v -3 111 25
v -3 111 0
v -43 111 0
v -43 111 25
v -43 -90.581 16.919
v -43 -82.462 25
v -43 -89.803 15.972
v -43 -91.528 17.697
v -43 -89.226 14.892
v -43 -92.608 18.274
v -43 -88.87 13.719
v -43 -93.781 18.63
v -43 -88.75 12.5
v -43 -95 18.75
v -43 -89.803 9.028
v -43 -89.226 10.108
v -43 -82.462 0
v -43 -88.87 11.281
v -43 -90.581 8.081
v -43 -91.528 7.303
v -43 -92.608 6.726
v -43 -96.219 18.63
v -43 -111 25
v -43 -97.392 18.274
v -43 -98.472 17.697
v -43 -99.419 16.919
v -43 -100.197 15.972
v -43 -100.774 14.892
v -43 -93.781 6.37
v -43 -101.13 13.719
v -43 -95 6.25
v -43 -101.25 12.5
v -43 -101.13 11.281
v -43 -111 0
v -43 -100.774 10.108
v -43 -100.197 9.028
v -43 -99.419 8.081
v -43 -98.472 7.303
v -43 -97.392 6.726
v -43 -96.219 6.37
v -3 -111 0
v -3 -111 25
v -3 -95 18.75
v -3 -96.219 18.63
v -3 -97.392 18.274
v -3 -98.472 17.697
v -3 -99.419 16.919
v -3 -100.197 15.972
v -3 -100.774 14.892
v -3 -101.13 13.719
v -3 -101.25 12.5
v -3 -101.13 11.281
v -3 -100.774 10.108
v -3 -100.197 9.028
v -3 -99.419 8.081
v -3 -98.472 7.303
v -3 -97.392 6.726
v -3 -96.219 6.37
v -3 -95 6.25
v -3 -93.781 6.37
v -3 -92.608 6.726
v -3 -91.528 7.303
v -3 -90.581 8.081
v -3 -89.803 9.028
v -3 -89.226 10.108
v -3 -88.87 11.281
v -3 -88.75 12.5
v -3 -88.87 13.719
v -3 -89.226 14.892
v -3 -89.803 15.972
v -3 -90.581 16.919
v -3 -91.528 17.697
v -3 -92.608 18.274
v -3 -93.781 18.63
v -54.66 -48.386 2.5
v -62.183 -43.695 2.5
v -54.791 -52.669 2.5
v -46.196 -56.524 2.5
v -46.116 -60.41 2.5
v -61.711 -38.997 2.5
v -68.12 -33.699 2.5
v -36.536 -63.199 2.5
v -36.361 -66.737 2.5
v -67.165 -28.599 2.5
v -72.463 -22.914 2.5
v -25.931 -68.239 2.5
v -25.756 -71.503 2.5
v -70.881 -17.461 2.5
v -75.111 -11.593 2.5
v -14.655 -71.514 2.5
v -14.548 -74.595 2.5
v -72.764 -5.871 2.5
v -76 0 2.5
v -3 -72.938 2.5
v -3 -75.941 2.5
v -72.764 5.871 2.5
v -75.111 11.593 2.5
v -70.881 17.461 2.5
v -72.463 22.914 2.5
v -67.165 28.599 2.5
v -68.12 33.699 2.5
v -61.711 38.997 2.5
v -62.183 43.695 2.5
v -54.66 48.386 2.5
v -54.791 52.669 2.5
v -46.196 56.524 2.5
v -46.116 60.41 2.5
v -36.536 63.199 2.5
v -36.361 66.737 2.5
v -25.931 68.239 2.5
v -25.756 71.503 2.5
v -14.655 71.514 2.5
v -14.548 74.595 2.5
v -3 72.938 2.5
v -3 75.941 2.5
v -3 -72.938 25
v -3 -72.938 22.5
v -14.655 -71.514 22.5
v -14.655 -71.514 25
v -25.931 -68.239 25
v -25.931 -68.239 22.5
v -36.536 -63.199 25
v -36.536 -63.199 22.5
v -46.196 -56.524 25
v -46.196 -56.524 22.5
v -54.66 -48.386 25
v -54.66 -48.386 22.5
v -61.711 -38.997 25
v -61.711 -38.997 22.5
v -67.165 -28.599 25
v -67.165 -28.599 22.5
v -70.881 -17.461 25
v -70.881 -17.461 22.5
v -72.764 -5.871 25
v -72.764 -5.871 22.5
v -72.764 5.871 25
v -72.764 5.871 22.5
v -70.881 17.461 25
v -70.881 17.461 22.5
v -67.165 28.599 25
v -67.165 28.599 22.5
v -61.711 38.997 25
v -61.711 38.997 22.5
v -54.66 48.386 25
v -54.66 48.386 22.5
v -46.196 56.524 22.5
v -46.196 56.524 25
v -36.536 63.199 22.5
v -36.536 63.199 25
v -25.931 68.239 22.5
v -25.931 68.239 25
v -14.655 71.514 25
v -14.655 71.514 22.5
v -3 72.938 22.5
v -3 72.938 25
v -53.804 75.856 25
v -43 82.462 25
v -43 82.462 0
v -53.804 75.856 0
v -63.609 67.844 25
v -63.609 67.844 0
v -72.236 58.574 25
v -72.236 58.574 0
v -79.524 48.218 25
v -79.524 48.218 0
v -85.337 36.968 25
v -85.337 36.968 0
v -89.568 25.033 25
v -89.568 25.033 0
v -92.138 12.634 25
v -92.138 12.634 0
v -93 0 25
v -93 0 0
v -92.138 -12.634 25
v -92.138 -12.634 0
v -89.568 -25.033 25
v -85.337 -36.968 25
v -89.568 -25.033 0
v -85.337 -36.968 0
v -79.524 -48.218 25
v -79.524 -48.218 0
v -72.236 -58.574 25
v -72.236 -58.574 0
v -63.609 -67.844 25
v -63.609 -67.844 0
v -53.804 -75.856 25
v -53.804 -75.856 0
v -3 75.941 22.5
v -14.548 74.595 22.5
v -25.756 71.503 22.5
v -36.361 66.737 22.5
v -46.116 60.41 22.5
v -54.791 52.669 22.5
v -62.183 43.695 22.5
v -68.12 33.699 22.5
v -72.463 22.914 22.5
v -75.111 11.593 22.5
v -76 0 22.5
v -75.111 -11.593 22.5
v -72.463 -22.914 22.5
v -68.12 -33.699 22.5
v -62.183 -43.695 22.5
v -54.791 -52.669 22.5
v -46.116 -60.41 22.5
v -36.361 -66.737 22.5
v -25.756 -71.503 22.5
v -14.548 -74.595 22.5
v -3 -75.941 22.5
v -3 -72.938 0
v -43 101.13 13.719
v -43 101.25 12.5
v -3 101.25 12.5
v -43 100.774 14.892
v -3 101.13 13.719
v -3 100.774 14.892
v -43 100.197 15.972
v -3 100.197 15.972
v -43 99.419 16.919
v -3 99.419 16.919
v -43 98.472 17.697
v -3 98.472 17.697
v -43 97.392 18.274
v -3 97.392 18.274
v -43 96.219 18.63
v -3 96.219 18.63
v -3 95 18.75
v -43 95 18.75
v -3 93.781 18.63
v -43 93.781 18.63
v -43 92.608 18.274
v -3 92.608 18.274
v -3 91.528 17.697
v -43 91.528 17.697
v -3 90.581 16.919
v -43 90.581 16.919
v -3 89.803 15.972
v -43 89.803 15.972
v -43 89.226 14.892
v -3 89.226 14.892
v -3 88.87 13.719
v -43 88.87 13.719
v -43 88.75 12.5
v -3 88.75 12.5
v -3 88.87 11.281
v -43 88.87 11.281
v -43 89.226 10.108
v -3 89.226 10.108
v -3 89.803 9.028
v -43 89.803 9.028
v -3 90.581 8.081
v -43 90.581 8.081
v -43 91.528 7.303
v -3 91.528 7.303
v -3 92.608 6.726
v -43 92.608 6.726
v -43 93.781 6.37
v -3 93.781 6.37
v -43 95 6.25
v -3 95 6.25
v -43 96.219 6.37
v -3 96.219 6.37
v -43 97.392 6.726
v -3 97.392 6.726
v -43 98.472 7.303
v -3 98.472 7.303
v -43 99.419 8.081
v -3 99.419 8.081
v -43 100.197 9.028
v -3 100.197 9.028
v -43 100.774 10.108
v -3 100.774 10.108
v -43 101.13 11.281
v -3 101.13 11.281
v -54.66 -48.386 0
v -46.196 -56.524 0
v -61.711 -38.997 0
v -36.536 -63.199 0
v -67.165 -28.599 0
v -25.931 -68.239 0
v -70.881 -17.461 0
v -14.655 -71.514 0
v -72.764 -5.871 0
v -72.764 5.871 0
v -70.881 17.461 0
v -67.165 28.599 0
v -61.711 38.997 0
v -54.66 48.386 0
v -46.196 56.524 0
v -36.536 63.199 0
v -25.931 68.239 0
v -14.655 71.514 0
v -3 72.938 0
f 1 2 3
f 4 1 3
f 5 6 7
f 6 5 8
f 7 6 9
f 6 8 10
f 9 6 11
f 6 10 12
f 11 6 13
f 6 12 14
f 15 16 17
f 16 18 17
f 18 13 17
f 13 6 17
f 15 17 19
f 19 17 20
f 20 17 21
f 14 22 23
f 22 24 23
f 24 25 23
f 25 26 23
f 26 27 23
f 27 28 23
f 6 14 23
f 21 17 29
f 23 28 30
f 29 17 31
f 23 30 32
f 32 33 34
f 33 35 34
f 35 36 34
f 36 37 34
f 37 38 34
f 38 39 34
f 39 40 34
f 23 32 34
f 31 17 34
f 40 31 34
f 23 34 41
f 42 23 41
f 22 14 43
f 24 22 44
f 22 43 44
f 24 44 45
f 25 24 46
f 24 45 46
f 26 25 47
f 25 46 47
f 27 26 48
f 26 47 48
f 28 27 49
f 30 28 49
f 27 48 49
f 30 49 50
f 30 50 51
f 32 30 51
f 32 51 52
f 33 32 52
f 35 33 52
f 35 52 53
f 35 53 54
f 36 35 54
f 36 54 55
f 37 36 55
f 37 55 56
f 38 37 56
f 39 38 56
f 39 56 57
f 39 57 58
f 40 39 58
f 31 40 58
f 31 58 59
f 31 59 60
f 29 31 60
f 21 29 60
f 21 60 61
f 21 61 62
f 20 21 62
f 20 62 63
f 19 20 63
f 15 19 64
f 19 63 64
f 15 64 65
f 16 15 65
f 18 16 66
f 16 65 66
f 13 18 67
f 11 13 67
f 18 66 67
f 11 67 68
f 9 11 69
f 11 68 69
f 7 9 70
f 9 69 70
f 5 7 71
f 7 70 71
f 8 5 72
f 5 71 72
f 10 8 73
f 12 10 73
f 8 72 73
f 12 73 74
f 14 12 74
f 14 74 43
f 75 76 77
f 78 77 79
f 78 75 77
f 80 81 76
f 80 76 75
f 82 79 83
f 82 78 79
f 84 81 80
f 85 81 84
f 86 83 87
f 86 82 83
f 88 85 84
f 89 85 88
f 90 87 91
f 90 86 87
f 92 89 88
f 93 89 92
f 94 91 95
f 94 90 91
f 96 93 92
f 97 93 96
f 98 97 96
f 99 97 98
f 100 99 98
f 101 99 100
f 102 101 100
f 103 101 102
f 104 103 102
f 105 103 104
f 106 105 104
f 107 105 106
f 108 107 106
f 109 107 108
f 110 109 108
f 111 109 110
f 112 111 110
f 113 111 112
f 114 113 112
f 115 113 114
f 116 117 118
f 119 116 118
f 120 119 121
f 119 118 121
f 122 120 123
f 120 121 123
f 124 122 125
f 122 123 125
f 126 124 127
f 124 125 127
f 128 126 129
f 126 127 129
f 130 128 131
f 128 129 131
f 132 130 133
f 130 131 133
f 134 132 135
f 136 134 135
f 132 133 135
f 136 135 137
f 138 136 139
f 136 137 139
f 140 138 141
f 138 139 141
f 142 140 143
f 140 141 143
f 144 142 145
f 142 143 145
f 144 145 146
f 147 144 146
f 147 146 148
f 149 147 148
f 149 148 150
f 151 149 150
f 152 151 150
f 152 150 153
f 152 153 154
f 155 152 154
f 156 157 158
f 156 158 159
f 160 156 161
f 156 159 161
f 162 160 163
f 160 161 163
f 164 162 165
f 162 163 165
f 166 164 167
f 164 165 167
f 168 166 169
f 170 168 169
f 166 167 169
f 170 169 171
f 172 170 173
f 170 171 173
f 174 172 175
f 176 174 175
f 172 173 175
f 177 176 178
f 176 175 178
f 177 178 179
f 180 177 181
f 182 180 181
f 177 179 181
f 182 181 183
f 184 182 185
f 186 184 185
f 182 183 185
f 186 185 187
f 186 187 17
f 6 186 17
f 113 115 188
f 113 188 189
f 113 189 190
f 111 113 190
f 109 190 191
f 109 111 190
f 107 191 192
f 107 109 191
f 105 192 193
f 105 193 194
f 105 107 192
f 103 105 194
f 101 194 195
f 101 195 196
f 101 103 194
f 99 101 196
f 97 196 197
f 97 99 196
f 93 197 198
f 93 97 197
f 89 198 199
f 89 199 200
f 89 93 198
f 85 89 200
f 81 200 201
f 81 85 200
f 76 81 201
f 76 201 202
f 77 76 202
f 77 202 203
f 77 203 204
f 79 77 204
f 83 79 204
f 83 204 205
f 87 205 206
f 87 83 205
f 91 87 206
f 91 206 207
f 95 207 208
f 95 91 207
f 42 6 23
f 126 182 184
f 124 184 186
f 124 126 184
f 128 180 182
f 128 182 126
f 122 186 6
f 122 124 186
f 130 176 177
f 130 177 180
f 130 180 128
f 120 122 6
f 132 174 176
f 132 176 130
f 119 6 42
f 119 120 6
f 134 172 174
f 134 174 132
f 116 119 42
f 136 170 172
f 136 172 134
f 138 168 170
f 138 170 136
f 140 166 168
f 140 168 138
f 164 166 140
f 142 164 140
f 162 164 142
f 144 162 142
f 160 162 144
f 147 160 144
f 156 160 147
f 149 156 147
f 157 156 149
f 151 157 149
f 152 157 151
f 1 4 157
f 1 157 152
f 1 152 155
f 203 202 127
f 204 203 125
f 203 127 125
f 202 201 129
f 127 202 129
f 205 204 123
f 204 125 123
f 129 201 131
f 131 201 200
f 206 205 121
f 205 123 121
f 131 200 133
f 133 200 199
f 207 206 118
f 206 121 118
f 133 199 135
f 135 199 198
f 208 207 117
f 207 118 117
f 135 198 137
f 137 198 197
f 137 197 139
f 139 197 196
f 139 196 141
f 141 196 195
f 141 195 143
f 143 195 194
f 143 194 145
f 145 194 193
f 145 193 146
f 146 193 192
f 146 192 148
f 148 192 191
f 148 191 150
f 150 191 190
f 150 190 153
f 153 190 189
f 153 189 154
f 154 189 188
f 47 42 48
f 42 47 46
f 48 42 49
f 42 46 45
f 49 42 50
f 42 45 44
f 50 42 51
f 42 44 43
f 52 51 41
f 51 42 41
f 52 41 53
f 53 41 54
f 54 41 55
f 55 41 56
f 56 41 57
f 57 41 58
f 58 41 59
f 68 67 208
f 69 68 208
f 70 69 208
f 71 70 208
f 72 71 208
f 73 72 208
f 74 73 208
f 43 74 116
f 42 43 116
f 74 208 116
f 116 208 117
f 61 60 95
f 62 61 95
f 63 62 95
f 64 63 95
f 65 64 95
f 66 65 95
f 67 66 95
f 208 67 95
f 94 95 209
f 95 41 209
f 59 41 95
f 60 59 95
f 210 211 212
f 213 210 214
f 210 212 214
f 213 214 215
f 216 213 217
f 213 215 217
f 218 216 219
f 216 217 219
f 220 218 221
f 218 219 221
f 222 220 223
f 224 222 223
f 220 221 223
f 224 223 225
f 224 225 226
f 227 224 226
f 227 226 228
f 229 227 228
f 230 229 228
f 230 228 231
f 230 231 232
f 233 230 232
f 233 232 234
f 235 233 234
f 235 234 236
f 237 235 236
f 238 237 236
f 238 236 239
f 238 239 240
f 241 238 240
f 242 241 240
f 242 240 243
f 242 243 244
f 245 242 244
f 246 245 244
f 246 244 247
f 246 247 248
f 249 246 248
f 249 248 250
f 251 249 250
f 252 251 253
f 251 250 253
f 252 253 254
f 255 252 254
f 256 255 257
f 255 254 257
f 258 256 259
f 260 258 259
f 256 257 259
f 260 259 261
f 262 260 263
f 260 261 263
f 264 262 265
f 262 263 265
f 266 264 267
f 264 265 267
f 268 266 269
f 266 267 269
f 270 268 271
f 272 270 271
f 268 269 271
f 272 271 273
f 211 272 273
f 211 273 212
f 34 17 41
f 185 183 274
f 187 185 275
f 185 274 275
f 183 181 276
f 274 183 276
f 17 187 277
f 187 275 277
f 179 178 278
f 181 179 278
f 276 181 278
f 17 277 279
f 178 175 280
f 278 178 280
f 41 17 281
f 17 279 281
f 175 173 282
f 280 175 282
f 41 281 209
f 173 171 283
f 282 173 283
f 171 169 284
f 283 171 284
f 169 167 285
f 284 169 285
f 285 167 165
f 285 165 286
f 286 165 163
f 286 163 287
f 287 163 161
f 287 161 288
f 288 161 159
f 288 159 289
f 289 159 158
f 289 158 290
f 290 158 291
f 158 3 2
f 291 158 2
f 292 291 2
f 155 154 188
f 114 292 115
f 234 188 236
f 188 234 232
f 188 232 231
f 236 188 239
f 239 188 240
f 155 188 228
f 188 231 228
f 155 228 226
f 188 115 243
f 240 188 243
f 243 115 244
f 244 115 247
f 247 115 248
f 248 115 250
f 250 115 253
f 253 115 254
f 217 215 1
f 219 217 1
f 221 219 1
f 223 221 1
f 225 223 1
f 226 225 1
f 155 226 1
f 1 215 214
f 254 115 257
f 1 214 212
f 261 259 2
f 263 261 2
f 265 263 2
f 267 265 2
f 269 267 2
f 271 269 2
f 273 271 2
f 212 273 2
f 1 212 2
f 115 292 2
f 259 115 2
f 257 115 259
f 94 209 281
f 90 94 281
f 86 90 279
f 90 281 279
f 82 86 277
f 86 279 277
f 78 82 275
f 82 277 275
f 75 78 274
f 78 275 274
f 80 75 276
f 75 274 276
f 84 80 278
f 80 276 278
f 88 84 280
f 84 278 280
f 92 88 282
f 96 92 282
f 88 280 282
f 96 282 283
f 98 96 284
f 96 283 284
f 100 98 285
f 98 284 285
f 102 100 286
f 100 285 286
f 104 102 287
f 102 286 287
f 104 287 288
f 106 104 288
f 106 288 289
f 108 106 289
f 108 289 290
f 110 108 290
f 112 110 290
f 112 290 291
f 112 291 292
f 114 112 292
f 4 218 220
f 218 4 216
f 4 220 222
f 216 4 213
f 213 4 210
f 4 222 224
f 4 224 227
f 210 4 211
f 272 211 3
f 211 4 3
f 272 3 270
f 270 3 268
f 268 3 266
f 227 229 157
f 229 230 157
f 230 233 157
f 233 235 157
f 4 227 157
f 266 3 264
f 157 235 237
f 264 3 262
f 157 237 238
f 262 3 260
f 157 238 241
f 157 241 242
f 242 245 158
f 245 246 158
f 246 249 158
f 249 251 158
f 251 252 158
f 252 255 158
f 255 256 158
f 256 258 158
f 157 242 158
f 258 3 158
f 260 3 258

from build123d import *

# Parameters (mm, degrees)
BOSS_EXTRUDE1_DEPTH = 25
SKETCH2_R           = 6.25
CUT_EXTRUDE1_DEPTH  = 146.07239572
CUT_EXTRUDE2_START  = 2.5
CUT_EXTRUDE2_DEPTH  = 20


with BuildPart() as part:
    # Sketch1 → Boss-Extrude1 (new body)
    with BuildSketch(Plane.XY):
        with BuildLine():
            Line((-3, 111), (-43, 111))
            Line((-43, 111), (-43, 82.462112512))
            ThreePointArc((-43, 82.462112512), (-93, 0), (-43, -82.462112512))
            Line((-43, -82.462112512), (-43, -111))
            Line((-43, -111), (-3, -111))
            Line((-3, -111), (-3, -72.938330115))
            ThreePointArc((-3, -72.938330115), (-73, 0), (-3, 72.938330115))
            Line((-3, 72.938330115), (-3, 111))
        make_face()
    extrude(amount=BOSS_EXTRUDE1_DEPTH)

    # Sketch2 → Cut-Extrude1 (cut, through all)
    with BuildSketch(Plane(origin=(-3, 0, 0), x_dir=(0, 0, -1), z_dir=(1, 0, 0))):
        with Locations((-12.5, 95)):
            Circle(SKETCH2_R)
        with Locations((-12.5, -95)):
            Circle(SKETCH2_R)
    extrude(amount=-CUT_EXTRUDE1_DEPTH, mode=Mode.SUBTRACT)

    # Sketch1<3> → Cut-Extrude2 (cut)
    with BuildSketch(Plane.XY.offset(CUT_EXTRUDE2_START)):
        with BuildLine():
            Line((-3, 72.938330115), (-3, 75.940766391))
            ThreePointArc((-3, 75.940766391), (-76, 0), (-3, -75.940766391))
            Line((-3, -75.940766391), (-3, -72.938330115))
            ThreePointArc((-3, -72.938330115), (-73, 0), (-3, 72.938330115))
        make_face()
    extrude(amount=CUT_EXTRUDE2_DEPTH, mode=Mode.SUBTRACT)


solid = part.part
